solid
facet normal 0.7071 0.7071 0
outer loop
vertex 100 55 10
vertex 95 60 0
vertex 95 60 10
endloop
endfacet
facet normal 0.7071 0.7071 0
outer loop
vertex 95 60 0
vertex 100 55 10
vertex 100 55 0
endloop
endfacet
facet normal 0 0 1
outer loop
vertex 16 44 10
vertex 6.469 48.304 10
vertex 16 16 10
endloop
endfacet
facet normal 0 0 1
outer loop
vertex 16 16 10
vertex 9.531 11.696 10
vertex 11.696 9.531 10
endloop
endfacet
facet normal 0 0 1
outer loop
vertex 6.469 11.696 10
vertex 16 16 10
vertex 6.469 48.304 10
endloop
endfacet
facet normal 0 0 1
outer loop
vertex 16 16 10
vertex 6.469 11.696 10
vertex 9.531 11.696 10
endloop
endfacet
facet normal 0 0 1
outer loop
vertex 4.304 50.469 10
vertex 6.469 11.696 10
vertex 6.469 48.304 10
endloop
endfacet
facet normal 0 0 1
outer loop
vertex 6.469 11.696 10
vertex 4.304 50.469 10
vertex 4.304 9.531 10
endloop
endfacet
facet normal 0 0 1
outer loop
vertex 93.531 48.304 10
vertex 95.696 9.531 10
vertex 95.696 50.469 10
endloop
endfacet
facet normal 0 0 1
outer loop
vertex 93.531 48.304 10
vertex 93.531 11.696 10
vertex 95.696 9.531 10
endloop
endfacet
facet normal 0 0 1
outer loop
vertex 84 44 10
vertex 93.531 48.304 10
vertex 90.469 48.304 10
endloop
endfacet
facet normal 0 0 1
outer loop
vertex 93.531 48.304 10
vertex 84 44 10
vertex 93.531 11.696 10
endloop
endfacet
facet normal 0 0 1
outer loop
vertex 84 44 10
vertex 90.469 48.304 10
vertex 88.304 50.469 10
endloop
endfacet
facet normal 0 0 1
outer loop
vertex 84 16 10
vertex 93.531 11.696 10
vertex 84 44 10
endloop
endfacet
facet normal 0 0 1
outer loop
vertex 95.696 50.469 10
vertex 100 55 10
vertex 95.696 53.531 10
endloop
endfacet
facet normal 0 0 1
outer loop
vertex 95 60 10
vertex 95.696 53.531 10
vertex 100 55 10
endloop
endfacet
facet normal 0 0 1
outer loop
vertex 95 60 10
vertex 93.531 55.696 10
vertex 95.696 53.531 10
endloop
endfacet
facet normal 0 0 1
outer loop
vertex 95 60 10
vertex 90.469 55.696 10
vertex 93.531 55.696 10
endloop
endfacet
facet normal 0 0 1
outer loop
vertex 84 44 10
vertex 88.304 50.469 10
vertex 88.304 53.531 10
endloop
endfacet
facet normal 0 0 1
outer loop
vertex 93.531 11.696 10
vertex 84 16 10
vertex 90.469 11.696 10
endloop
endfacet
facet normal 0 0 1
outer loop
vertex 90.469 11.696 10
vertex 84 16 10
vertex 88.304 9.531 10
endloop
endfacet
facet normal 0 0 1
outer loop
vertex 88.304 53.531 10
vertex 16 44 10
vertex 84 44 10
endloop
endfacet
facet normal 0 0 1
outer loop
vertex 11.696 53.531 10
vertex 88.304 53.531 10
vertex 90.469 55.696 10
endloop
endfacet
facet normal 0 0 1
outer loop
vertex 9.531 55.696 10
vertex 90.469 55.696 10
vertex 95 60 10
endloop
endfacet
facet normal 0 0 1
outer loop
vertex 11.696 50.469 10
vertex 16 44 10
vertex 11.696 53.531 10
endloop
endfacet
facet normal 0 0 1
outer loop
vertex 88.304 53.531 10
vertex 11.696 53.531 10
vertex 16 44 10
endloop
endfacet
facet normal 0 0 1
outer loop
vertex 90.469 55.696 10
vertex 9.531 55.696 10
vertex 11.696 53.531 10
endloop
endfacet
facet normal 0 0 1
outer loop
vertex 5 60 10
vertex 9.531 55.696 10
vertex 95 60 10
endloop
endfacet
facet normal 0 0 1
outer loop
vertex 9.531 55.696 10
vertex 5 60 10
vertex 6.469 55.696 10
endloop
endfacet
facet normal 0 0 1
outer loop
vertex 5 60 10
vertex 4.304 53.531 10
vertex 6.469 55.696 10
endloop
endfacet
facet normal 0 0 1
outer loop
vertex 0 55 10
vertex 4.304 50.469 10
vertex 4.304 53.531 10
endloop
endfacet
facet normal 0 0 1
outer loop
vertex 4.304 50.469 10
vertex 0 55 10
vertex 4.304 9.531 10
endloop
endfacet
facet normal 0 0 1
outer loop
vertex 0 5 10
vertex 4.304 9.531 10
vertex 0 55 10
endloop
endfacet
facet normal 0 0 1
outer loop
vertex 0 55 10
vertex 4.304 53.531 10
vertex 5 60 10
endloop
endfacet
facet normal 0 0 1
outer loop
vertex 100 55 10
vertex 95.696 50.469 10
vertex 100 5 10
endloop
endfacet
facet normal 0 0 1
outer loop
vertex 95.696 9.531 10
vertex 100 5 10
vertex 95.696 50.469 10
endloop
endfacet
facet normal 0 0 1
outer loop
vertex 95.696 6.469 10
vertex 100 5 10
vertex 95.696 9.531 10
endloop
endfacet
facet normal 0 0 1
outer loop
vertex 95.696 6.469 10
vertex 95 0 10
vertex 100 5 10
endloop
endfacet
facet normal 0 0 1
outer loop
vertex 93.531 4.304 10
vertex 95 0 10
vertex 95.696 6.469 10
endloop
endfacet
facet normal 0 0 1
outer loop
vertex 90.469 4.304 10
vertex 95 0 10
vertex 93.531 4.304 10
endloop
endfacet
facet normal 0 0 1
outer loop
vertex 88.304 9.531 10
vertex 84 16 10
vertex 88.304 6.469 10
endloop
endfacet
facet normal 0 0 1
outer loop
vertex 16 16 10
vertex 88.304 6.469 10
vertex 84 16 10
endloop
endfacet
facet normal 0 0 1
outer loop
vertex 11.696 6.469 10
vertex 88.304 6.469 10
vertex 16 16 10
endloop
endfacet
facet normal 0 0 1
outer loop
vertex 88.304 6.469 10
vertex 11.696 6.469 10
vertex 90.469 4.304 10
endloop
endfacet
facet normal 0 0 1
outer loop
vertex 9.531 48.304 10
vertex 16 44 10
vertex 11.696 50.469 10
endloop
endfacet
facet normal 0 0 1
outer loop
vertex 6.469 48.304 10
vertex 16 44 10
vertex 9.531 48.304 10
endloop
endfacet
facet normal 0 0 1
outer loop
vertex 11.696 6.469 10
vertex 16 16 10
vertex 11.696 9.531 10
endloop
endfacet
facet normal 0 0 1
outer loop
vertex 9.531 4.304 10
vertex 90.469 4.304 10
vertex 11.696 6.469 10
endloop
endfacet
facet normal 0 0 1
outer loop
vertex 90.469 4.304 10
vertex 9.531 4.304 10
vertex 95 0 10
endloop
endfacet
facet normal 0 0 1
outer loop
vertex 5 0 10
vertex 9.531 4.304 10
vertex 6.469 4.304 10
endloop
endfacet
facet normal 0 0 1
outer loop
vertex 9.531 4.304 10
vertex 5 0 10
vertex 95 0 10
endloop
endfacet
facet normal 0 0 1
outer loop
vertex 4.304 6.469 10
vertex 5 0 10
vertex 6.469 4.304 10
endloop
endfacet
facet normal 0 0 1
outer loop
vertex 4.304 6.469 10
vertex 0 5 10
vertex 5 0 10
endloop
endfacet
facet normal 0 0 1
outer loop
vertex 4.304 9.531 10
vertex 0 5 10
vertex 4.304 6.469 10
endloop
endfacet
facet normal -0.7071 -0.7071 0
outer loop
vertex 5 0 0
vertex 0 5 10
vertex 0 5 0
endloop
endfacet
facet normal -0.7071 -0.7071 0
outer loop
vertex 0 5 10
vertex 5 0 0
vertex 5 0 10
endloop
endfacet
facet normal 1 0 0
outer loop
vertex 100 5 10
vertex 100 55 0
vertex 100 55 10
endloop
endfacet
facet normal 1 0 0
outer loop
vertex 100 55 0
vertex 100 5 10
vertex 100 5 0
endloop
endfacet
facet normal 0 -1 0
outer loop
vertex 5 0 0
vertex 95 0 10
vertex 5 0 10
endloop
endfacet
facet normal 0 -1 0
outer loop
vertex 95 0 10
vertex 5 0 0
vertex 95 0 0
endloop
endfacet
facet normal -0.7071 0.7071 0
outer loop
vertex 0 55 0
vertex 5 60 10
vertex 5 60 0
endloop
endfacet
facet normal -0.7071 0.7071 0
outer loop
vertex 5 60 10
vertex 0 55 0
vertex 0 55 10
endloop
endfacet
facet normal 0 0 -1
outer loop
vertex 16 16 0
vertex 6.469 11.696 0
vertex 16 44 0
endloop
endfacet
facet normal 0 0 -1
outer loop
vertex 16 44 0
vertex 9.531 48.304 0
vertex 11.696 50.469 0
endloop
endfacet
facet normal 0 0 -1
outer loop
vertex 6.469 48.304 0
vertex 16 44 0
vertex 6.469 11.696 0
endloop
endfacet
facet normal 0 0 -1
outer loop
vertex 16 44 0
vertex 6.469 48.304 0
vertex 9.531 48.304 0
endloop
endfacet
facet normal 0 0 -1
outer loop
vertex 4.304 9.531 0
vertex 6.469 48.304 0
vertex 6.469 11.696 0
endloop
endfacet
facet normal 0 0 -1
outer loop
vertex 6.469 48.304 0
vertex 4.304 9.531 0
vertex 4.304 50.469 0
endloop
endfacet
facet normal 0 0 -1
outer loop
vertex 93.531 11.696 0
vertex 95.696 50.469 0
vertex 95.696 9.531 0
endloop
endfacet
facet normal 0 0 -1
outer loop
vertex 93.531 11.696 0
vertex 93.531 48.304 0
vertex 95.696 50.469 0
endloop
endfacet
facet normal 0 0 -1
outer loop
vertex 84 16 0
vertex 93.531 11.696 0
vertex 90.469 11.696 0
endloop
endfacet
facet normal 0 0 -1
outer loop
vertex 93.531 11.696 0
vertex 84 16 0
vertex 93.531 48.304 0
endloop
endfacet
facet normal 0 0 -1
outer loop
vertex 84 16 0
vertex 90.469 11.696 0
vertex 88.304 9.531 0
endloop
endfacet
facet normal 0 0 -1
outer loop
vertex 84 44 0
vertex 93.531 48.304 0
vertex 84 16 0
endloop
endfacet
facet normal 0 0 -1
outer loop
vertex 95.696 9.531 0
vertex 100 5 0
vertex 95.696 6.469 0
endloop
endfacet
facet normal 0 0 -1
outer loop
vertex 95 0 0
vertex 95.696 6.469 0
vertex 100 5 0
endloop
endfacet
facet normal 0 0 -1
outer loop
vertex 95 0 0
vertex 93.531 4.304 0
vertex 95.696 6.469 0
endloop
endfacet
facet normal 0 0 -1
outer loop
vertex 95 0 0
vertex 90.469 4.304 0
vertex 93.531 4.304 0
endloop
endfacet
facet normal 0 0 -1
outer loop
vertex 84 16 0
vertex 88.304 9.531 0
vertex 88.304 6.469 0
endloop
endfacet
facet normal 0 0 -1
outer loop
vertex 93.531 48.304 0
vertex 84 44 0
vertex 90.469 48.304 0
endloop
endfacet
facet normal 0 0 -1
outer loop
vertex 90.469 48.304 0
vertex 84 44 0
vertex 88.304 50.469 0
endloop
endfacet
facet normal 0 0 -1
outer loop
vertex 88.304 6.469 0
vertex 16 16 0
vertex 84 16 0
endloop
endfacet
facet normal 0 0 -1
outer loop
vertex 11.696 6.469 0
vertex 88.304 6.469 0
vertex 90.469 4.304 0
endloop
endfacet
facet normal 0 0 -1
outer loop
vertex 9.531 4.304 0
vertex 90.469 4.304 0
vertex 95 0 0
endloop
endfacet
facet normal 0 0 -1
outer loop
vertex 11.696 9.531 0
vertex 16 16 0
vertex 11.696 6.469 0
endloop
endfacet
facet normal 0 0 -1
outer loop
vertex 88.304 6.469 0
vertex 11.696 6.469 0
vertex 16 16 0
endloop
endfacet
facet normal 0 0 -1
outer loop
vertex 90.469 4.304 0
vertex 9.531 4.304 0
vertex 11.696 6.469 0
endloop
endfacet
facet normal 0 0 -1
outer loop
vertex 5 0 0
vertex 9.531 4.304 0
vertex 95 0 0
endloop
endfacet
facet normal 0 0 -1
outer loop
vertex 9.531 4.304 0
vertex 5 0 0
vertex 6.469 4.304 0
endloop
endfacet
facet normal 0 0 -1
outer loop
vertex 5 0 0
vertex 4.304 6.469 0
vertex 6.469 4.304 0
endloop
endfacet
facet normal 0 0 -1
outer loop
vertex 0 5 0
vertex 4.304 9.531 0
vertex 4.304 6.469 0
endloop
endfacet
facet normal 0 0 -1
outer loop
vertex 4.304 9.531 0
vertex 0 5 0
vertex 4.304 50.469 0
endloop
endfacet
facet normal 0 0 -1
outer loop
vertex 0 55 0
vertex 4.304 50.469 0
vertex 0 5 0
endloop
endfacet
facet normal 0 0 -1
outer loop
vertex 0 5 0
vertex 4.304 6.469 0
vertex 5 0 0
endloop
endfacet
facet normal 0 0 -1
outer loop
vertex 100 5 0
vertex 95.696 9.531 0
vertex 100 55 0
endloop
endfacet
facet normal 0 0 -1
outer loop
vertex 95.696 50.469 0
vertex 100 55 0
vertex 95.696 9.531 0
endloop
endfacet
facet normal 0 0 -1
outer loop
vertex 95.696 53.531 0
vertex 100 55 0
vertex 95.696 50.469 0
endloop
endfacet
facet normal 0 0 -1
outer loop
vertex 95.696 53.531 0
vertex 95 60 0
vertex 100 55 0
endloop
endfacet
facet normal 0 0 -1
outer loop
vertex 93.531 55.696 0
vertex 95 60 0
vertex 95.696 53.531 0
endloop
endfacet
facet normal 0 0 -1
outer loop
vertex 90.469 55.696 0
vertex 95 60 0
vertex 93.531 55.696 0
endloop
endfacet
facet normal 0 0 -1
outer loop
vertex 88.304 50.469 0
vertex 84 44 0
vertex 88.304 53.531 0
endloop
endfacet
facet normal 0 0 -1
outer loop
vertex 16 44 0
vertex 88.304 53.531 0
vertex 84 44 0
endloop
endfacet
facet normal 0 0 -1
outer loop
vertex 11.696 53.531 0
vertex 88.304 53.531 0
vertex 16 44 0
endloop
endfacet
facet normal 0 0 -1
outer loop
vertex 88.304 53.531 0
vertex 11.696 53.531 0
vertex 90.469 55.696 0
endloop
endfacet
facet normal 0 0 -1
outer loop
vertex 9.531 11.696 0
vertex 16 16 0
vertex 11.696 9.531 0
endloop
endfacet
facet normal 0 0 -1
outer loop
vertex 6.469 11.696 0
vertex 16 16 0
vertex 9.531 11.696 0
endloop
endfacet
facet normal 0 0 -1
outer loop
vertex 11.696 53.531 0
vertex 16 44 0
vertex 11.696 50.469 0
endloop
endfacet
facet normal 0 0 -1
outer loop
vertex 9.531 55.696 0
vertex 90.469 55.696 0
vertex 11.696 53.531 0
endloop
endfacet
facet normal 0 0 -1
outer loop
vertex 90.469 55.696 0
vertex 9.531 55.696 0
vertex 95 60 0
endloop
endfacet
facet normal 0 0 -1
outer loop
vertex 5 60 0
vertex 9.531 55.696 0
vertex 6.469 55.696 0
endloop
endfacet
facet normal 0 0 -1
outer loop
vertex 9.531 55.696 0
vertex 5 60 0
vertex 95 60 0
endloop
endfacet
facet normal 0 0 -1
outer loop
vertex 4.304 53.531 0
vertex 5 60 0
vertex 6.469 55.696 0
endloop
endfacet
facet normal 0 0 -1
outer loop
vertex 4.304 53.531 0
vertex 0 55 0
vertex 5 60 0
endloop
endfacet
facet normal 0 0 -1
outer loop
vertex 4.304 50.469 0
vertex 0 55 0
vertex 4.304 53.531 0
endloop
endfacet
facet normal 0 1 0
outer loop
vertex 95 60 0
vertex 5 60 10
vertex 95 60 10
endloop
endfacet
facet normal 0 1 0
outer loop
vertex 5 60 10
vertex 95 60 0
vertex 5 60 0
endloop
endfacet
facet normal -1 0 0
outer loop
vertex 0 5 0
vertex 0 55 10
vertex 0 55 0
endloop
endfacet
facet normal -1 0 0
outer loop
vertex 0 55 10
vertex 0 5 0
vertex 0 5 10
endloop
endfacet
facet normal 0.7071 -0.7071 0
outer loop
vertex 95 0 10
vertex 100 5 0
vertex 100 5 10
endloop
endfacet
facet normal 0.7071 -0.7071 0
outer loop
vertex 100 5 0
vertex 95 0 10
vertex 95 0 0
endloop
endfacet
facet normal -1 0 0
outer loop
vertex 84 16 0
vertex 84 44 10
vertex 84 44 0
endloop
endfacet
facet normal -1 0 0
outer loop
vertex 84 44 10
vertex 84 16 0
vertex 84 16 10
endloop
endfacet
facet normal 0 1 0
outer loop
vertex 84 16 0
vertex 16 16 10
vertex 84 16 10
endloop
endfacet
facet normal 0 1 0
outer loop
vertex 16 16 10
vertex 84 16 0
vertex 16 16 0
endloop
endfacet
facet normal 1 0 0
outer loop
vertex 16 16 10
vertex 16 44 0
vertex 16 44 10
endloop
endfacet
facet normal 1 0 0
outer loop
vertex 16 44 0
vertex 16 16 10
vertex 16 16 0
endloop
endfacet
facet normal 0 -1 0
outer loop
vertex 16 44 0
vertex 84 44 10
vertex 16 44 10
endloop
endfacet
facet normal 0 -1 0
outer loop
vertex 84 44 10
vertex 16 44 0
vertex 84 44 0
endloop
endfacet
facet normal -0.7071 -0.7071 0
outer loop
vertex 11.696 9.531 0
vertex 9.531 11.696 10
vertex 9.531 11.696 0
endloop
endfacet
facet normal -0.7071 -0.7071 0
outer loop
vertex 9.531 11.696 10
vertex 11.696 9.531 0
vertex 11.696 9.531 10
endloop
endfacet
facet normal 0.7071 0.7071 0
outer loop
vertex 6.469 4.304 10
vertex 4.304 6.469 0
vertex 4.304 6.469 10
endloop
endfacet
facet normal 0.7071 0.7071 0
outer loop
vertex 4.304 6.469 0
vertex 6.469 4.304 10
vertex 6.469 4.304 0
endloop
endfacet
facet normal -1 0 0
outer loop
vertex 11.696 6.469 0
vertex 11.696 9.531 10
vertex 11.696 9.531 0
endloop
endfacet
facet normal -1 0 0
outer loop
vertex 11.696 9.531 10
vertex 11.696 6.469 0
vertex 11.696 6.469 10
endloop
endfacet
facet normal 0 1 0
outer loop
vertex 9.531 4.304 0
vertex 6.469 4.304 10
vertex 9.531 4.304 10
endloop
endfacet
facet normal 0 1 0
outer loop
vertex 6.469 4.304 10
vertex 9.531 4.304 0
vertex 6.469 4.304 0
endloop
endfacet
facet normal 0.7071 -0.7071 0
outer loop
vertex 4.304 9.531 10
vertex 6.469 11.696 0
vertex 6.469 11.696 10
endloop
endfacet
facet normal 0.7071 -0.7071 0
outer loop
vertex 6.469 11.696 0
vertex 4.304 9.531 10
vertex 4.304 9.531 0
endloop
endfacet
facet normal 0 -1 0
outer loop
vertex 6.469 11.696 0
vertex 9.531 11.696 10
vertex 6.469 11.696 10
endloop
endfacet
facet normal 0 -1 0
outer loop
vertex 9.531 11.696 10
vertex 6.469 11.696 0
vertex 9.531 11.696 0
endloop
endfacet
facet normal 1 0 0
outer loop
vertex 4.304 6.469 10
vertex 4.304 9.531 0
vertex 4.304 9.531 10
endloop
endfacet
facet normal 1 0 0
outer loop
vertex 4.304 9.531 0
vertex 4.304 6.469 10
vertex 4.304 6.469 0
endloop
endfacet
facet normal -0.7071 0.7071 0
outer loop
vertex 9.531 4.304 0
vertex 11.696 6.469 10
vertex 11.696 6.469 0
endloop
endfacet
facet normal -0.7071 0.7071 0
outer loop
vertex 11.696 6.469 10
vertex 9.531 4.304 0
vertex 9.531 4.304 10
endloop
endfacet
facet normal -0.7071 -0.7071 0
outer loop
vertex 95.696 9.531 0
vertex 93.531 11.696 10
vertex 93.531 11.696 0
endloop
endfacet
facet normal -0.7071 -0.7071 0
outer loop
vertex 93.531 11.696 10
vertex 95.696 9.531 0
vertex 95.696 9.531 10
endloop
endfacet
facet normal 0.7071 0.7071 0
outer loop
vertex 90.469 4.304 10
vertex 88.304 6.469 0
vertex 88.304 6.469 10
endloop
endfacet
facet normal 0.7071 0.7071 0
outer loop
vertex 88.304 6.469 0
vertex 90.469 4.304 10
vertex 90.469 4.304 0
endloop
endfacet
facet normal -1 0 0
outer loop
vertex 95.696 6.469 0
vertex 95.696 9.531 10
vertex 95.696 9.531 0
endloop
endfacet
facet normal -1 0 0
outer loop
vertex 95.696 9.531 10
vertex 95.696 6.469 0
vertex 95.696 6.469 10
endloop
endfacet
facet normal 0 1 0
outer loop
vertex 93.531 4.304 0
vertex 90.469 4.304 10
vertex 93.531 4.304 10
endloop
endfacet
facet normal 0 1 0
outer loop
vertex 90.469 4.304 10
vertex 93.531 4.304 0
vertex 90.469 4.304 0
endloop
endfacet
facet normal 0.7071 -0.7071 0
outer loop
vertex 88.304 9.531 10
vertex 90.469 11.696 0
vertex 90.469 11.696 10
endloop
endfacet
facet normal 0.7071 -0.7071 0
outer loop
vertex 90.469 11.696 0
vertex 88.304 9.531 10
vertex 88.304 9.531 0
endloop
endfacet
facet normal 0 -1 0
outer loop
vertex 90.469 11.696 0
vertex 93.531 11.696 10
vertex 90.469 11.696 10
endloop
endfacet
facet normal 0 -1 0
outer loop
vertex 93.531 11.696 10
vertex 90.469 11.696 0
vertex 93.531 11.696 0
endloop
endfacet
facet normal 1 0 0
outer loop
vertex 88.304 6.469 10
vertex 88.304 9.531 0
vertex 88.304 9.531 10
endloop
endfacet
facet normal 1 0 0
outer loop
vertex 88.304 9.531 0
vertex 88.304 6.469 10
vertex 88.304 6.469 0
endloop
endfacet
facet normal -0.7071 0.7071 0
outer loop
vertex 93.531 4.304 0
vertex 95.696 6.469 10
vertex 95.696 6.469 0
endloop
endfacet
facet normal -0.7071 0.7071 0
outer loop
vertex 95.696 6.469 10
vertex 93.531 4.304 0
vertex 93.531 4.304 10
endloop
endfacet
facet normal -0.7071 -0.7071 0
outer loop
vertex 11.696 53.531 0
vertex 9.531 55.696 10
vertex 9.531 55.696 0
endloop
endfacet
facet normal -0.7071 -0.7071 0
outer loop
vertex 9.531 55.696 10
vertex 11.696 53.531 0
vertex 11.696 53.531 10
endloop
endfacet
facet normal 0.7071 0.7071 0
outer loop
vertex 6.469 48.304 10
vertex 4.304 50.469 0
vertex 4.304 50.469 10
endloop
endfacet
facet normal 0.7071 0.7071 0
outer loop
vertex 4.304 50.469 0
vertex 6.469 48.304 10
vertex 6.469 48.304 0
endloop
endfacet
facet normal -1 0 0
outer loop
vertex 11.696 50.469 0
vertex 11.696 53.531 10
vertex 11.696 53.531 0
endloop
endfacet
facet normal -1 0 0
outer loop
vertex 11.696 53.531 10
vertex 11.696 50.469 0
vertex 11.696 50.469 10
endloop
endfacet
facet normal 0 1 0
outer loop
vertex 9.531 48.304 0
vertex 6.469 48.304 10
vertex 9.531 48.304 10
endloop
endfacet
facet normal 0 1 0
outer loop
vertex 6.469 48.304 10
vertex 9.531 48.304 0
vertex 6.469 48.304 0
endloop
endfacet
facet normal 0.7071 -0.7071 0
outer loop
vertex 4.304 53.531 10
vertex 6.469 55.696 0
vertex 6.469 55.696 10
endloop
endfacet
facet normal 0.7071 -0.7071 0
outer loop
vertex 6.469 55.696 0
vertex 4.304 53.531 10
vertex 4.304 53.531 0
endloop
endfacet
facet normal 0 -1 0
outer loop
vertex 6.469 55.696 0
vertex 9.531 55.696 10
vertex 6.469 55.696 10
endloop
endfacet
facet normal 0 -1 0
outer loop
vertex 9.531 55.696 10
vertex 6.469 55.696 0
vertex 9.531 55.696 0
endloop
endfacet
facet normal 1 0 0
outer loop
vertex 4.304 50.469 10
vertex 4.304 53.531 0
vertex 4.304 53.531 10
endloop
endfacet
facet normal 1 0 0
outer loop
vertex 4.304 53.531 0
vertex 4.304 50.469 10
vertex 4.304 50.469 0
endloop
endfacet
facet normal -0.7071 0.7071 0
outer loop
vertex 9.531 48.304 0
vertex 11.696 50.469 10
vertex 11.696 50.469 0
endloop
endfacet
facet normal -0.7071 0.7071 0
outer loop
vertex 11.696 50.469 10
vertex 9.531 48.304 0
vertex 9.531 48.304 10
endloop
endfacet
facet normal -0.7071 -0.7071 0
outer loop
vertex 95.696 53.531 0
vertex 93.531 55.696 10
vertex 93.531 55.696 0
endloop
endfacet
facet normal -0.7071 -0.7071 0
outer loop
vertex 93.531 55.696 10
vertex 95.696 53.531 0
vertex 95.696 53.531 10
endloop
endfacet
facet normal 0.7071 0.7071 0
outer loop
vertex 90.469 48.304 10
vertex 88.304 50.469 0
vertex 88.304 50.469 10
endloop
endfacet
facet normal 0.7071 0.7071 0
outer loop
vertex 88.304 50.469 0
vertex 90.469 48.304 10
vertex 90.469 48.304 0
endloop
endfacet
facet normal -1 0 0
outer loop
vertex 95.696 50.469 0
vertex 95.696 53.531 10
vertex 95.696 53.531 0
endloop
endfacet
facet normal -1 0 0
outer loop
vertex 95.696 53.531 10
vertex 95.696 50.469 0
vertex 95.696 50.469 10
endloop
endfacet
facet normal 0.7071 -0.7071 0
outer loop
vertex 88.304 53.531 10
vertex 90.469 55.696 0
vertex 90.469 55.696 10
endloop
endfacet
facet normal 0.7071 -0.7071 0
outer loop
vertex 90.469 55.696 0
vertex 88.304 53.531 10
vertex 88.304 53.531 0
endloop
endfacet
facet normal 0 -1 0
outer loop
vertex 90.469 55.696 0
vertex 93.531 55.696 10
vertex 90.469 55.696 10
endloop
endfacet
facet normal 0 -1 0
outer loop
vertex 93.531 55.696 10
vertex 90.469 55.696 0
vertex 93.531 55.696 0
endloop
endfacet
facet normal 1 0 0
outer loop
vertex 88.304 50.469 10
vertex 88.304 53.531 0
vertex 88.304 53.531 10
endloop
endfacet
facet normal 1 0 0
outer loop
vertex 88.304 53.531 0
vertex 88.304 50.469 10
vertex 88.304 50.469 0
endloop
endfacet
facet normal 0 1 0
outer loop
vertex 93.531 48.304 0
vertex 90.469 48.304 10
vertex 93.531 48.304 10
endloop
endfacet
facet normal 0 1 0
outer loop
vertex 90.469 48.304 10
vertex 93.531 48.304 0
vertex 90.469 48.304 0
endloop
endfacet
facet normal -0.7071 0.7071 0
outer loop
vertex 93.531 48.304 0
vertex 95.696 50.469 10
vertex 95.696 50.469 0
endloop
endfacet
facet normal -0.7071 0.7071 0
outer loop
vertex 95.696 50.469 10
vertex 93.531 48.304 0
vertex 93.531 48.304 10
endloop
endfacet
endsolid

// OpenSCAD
$fn = 32;

// ----------------------------------------------------------------------
// Frame plate: 100 x 60 frame, 16 mm rails
// ----------------------------------------------------------------------

// --- parameters (mm) ---
plate_l = 100;            // plate length, X
plate_w = 60;             // plate width, Y
plate_t = 10;             // plate thickness, Z (extrusion height)
corner_c = 5;             // corner chamfer
frame_bar = 16;           // frame rail width
bolt_r = 4;               // corner bolt window radius
bolt_inset = 8;           // bolt centre inset from the edges

win_l = plate_l - 2 * frame_bar;  // window length
win_w = plate_w - 2 * frame_bar;  // window width
bolt_d = 2 * bolt_r;  // corner hole diameter

profile = [[5, 0], [95, 0], [100, 5], [100, 55], [95, 60], [5, 60], [0, 55], [0, 5]];  // primary outline, 8 points, counter clockwise
void_1 = [[16, 16], [84, 16], [84, 44], [16, 44]];  // the window, 4 points
void_2 = [[11.696, 9.531], [9.531, 11.696], [6.469, 11.696], [4.304, 9.531], [4.304, 6.469], [6.469, 4.304], [9.531, 4.304], [11.696, 6.469]];  // corner bolt window, 8 points
void_3 = [[95.696, 9.531], [93.531, 11.696], [90.469, 11.696], [88.304, 9.531], [88.304, 6.469], [90.469, 4.304], [93.531, 4.304], [95.696, 6.469]];  // corner bolt window, 8 points
void_4 = [[11.696, 53.531], [9.531, 55.696], [6.469, 55.696], [4.304, 53.531], [4.304, 50.469], [6.469, 48.304], [9.531, 48.304], [11.696, 50.469]];  // corner bolt window, 8 points
void_5 = [[95.696, 53.531], [93.531, 55.696], [90.469, 55.696], [88.304, 53.531], [88.304, 50.469], [90.469, 48.304], [93.531, 48.304], [95.696, 50.469]];  // corner bolt window, 8 points

// --- the one profile operation ---
difference() {
  linear_extrude(height = plate_t) polygon(points = profile);
  translate([0, 0, -1])
    linear_extrude(height = plate_t + 2) polygon(points = void_1);
  translate([0, 0, -1])
    linear_extrude(height = plate_t + 2) polygon(points = void_2);
  translate([0, 0, -1])
    linear_extrude(height = plate_t + 2) polygon(points = void_3);
  translate([0, 0, -1])
    linear_extrude(height = plate_t + 2) polygon(points = void_4);
  translate([0, 0, -1])
    linear_extrude(height = plate_t + 2) polygon(points = void_5);
}
